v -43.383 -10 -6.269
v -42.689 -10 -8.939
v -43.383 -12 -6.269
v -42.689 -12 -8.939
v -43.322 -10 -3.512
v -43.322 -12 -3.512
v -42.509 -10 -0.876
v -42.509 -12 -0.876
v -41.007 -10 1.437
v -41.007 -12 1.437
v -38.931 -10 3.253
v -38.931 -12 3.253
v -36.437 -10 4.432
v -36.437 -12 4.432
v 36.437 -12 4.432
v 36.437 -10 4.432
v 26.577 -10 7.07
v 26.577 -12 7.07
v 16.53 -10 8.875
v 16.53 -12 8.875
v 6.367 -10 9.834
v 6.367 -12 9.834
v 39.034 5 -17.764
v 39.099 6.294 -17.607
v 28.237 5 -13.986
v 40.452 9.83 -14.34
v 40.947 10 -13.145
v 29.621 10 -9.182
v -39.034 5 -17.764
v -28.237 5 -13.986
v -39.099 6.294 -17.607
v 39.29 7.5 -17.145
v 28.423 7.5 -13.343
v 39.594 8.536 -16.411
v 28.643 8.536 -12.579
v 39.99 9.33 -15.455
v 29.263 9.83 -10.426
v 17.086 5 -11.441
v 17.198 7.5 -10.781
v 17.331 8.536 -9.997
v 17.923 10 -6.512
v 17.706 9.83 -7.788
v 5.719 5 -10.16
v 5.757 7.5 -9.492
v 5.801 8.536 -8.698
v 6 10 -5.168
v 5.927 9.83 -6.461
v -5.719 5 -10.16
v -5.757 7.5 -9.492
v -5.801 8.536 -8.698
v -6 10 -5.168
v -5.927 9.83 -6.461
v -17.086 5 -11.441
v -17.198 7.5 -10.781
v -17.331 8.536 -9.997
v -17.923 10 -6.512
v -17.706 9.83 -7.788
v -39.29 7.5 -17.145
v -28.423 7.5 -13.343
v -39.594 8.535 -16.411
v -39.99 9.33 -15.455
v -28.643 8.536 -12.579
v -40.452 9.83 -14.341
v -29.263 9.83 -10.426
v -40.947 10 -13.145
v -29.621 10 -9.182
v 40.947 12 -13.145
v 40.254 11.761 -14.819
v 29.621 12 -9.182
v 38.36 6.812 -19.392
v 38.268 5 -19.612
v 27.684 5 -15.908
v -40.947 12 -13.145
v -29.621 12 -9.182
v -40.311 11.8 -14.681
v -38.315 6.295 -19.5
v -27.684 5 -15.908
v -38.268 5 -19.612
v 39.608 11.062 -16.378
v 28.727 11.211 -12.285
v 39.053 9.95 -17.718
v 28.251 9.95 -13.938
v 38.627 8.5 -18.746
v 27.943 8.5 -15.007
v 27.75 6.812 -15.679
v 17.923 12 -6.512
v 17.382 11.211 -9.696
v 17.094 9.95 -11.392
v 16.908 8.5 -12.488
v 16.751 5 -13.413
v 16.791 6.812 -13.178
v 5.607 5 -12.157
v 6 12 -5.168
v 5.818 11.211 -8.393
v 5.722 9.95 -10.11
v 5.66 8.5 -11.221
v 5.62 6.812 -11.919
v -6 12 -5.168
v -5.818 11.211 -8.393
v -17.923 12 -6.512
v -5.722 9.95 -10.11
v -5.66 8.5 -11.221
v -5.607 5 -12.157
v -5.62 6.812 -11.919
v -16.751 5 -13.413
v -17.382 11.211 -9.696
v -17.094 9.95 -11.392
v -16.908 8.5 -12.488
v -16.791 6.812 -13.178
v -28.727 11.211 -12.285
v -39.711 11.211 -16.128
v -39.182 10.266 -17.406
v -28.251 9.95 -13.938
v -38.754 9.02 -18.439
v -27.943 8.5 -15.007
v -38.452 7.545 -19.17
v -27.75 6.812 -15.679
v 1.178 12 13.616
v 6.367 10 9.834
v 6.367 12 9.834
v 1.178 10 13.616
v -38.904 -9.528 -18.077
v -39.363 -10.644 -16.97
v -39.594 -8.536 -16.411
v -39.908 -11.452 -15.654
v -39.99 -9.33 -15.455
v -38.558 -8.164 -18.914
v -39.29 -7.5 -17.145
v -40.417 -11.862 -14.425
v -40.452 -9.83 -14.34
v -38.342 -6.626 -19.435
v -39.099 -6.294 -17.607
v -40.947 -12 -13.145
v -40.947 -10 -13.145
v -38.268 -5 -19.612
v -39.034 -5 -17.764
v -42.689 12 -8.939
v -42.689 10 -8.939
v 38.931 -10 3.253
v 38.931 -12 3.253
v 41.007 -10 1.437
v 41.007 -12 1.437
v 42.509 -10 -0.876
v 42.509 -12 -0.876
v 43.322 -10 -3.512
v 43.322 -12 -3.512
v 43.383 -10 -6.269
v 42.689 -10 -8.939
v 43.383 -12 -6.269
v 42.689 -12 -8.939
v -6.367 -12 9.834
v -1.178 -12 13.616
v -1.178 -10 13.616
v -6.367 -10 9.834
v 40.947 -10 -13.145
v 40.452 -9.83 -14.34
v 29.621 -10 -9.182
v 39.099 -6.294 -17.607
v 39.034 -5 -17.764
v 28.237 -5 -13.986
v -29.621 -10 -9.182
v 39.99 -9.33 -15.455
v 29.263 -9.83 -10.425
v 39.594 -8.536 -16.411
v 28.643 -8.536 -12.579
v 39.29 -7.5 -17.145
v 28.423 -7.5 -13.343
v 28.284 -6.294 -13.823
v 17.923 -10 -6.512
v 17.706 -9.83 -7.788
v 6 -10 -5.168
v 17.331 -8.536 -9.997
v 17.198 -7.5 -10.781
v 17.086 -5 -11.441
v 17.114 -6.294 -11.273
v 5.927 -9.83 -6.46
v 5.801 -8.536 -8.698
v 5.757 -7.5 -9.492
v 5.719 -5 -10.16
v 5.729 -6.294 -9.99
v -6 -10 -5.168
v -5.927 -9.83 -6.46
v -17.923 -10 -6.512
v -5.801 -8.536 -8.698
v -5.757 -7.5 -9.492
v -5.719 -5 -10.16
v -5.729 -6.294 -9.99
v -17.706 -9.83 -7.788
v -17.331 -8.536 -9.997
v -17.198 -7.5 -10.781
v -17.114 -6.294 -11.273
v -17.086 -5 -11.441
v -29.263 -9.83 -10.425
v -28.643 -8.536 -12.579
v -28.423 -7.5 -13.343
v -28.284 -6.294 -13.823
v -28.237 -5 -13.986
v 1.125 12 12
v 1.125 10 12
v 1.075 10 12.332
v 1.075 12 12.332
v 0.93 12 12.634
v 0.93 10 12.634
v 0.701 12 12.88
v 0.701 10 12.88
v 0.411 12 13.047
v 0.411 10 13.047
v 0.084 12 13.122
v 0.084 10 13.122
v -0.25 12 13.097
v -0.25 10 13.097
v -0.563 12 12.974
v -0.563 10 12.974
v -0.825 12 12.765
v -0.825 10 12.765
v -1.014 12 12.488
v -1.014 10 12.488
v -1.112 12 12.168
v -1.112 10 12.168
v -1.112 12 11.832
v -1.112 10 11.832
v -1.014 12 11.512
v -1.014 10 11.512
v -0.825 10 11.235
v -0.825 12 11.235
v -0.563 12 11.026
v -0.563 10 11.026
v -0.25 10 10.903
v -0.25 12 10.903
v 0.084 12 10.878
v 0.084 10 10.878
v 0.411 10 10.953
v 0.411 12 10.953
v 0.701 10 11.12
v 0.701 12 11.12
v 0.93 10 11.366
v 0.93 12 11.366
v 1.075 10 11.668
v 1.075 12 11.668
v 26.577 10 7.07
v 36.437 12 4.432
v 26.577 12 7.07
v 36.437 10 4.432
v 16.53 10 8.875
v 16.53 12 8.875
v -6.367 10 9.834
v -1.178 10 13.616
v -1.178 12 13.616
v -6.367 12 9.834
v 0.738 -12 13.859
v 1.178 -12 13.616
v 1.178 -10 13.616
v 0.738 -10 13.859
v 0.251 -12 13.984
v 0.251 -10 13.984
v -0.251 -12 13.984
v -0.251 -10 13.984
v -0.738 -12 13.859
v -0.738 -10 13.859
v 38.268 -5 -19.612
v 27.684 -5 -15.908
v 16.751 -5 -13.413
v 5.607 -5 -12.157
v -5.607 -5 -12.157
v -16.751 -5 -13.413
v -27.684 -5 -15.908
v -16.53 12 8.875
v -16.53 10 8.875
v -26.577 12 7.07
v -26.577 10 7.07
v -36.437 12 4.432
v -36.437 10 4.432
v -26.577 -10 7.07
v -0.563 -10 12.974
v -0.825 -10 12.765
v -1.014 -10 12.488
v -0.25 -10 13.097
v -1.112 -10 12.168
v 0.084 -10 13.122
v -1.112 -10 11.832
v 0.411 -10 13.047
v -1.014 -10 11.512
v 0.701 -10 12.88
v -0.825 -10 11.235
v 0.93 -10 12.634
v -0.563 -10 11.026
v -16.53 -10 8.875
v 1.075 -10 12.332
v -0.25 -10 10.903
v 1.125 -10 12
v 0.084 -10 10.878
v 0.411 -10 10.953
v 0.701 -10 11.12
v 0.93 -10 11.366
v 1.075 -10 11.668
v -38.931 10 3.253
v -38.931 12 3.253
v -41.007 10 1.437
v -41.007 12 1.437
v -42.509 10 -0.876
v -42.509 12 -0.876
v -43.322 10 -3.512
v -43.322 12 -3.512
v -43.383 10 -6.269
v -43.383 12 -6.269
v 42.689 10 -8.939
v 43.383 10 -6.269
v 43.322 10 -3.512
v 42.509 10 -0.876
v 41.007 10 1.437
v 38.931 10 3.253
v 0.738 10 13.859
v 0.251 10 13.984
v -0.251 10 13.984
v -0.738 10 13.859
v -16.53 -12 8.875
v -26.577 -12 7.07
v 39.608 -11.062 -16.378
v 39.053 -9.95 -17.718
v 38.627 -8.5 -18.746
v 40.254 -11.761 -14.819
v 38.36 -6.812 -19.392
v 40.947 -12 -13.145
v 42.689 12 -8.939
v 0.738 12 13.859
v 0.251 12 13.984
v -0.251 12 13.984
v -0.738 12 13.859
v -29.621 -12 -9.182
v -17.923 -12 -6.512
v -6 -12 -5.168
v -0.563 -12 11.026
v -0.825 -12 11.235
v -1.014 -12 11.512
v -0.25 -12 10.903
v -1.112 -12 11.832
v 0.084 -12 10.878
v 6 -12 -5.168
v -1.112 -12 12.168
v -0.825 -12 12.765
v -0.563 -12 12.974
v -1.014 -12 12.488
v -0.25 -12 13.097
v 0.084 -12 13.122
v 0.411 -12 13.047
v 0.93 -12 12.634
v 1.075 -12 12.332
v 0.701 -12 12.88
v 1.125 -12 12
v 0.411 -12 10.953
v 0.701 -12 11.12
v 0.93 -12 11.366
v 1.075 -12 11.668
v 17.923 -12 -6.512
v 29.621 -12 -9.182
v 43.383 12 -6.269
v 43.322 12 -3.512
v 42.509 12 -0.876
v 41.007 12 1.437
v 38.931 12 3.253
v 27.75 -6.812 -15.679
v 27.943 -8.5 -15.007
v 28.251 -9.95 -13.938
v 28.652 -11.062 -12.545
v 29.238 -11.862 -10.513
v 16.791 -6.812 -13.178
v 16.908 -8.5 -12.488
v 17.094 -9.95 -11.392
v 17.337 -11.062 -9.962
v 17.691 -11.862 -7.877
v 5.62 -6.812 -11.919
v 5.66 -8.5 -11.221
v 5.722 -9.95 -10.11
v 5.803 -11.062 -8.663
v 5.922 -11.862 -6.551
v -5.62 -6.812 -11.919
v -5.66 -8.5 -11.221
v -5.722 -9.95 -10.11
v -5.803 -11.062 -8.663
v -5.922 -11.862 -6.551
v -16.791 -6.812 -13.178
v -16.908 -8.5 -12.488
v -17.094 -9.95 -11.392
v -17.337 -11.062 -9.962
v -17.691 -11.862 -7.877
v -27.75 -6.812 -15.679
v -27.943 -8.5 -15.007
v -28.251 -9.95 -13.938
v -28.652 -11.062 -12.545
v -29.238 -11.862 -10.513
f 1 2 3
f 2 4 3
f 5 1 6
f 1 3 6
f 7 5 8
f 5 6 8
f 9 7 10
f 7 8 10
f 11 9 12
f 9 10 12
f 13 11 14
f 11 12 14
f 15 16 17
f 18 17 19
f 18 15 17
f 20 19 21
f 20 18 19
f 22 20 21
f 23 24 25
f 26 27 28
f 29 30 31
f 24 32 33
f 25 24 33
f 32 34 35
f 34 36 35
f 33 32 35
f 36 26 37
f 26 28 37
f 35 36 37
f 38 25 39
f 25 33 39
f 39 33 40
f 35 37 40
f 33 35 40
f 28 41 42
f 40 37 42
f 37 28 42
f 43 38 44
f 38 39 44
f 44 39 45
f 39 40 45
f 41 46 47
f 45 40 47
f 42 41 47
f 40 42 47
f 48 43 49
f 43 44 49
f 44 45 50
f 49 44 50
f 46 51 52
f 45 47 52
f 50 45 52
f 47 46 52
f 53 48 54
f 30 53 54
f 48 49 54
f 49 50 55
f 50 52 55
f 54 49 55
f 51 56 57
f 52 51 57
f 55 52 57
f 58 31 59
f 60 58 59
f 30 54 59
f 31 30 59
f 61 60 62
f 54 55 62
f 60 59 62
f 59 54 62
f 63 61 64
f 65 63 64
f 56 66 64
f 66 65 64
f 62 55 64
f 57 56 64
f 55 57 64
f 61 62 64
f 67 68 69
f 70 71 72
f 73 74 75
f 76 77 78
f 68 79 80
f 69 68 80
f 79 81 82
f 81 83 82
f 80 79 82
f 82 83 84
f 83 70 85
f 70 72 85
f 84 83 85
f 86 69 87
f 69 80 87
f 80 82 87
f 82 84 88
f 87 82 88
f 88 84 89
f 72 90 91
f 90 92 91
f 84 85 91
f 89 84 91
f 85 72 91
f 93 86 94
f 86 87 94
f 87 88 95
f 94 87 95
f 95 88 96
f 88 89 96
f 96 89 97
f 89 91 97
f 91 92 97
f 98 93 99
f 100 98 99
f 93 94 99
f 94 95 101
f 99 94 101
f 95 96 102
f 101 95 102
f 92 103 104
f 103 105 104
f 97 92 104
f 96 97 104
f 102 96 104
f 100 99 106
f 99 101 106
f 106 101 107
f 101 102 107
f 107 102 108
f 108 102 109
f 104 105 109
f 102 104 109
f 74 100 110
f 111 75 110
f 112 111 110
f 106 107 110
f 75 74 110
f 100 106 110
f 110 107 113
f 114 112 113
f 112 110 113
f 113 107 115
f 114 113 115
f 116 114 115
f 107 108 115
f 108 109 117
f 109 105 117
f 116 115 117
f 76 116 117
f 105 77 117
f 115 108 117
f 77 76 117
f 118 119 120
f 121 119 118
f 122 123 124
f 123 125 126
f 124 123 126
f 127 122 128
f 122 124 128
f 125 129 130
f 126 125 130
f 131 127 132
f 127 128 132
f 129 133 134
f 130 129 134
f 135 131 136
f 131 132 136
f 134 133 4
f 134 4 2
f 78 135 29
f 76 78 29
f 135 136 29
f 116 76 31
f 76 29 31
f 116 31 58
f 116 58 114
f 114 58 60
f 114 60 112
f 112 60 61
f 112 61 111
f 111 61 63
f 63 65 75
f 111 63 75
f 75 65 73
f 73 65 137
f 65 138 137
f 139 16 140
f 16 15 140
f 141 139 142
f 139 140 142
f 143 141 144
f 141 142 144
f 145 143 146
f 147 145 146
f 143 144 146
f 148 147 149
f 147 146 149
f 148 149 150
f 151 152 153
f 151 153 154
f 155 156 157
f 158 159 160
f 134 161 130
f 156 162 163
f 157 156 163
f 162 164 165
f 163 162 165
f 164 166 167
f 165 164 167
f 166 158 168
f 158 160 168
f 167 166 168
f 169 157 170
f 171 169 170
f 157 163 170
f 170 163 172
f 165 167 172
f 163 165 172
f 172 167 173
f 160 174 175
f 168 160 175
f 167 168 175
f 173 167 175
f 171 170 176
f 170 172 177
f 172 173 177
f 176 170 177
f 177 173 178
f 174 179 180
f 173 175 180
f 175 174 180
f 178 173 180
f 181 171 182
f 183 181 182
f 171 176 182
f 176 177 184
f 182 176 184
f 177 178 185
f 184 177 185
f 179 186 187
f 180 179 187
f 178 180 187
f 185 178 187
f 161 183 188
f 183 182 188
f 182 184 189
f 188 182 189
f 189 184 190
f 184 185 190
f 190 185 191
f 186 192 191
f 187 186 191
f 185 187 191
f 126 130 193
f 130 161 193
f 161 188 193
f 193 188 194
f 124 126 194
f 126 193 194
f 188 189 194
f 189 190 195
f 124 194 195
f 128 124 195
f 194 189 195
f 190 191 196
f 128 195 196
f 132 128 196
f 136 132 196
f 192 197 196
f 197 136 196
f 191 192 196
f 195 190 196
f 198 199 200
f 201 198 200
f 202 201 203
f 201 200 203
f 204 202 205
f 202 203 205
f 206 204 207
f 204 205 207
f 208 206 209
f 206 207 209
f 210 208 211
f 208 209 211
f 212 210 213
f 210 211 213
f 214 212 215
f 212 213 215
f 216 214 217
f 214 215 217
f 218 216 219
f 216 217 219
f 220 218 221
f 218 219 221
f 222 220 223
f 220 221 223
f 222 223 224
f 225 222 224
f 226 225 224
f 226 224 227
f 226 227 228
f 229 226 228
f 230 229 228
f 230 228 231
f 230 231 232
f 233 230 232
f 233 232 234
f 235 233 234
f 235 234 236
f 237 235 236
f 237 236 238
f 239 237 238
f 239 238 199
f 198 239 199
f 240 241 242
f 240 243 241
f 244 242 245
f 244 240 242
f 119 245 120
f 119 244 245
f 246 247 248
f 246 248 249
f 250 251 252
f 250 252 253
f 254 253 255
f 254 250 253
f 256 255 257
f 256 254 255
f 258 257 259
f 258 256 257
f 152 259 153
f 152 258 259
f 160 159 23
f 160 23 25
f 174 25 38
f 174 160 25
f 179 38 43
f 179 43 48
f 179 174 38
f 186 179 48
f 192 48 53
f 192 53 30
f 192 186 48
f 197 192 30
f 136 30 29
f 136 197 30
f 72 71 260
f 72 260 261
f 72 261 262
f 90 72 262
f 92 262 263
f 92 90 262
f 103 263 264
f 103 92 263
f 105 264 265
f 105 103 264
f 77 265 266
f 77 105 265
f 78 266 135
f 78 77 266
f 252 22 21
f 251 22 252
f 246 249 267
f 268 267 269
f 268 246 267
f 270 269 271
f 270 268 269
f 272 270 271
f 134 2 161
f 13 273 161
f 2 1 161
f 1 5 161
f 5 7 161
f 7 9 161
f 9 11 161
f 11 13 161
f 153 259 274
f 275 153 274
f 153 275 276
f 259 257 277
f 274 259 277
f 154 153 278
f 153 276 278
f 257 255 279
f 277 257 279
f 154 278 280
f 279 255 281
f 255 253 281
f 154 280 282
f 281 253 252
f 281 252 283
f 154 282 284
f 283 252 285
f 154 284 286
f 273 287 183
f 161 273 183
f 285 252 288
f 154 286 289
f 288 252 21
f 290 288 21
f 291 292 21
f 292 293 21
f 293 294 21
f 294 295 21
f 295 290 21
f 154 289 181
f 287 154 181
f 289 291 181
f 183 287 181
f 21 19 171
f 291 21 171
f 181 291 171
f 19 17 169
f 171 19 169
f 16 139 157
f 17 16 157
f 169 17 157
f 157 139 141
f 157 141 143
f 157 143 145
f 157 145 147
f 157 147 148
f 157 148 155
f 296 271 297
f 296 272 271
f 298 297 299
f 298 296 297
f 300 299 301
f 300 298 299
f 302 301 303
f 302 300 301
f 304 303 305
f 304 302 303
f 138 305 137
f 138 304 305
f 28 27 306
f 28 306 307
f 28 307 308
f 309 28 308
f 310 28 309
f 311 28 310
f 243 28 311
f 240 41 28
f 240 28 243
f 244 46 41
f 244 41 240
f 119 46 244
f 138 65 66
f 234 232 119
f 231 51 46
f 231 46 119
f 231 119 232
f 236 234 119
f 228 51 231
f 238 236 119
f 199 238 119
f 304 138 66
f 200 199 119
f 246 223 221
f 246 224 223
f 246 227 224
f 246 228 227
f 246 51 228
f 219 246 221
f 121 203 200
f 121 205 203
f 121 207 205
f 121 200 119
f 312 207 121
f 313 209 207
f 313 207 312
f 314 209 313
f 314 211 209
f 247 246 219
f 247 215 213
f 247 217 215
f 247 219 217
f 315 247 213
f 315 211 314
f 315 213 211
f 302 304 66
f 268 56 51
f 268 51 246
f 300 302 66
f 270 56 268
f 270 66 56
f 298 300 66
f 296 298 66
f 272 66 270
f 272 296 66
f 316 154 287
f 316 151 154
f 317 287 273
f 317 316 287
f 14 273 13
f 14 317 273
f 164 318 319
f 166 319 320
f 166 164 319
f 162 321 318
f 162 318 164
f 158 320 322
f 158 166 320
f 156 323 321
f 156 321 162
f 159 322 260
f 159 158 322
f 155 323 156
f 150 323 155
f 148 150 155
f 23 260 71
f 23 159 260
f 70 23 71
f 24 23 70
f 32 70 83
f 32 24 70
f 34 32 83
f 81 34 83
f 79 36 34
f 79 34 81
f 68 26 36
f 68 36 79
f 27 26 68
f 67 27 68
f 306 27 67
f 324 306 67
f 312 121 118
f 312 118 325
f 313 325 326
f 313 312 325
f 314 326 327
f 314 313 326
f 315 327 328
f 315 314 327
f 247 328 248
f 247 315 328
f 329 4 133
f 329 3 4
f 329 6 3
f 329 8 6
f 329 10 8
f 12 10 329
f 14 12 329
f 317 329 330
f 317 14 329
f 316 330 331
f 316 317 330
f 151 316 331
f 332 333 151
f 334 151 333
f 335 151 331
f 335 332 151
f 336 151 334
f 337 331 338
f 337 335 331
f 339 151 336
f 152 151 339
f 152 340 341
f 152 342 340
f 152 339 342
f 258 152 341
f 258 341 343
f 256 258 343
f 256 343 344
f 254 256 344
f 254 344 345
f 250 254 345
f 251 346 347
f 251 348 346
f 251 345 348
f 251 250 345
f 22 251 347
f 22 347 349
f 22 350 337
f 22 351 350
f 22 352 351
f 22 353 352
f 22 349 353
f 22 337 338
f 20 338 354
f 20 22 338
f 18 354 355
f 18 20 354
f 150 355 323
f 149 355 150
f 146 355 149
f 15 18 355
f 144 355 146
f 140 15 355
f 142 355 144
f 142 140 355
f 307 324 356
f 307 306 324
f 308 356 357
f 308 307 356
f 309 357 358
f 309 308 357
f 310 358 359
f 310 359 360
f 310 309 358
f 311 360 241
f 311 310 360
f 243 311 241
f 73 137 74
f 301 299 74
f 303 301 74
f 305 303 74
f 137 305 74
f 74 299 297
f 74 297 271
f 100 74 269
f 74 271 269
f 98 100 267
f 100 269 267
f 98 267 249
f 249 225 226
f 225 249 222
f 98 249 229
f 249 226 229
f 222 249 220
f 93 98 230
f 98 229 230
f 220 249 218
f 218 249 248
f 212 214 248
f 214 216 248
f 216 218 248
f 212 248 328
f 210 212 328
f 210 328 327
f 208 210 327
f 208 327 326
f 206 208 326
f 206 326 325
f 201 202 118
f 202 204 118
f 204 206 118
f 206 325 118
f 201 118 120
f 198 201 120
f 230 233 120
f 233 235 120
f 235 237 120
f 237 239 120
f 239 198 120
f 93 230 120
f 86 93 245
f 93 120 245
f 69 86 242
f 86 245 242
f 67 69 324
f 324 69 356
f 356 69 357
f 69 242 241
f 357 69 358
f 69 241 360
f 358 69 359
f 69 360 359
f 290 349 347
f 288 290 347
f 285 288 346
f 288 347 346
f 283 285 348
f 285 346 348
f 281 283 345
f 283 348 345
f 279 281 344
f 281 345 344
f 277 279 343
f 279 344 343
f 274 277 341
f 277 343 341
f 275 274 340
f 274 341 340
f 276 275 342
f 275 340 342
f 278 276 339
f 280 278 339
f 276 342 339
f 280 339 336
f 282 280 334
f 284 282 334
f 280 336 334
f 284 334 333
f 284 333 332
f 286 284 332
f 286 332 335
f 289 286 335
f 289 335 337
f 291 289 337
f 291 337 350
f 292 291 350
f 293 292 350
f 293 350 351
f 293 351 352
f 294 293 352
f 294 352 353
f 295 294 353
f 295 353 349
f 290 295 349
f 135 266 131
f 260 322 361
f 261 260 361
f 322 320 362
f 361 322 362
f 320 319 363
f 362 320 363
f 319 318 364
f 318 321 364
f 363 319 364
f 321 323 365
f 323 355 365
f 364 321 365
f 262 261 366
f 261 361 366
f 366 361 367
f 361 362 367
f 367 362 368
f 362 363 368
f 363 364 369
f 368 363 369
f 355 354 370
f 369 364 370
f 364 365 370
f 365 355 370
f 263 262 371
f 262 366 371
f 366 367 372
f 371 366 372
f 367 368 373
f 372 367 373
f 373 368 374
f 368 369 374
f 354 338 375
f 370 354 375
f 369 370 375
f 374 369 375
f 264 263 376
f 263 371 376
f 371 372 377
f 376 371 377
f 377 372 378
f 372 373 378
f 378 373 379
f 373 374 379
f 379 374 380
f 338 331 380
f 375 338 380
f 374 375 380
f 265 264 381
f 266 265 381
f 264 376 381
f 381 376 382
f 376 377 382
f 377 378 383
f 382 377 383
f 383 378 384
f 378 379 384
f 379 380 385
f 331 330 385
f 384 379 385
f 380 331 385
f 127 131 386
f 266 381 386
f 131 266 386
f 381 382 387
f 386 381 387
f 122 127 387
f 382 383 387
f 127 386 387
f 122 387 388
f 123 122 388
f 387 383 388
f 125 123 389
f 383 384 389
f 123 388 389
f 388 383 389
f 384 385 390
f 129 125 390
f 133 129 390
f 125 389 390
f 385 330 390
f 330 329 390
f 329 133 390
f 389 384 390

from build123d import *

# Parameters (mm, degrees)
F1_ANGLE_BACK = 22.5
F1_ANGLE      = 45
F2_R          = 1.125
F3_DEPTH      = 24
F5_DEPTH      = 10
F6_R          = 10
F7_R          = 5
F8_R          = 7


with BuildPart() as f1:
    # F0 (on Right) → F1 (revolve)
    with BuildSketch(Plane.YZ, mode=Mode.PRIVATE) as f1_sk:
        Polygon((10, 10), (10, -10), (-10, -10), (-10, 10), (-12, 10), (-12, -12), (12, -12), (12, 10), align=None)
    revolve(f1_sk.sketch.rotate(Axis((0, -36.9127653539, -112), (0, -1, 0)), -F1_ANGLE_BACK), axis=Axis((0, -36.9127653539, -112), (0, -1, 0)), revolution_arc=F1_ANGLE)

    # F2 (on face) → F3 (join)
    with BuildSketch(Plane.XZ.offset(12)):
        with BuildLine():
            Line((6.3674504599, 9.8337210079), (1.178053683, 13.6162269395))
            ThreePointArc((1.178053683, 13.6162269395), (0, 14), (-1.178053683, 13.6162269395))
            Line((-1.178053683, 13.6162269395), (-6.3674504599, 9.8337210079))
            ThreePointArc((-6.3674504599, 9.8337210079), (0, 10), (6.3674504599, 9.8337210079))
        make_face()
        with Locations((0, 12)):
            Circle(F2_R, mode=Mode.SUBTRACT)
    extrude(amount=-F3_DEPTH)

    # F4 (on Right) → F5 (cut, symmetric)
    with BuildSketch(Plane.YZ):
        Polygon((-10, 0), (0, 0), (10, 0), (10, 19.6699723601), (-10, 19.6699723601), align=None)
    extrude(amount=F5_DEPTH, both=True, mode=Mode.SUBTRACT)

    # F6
    f6_edges = [f1.edges().sort_by_distance(p)[0] for p in [
        (-46.687379, 11, 0.713303),
        (-46.687379, -11, 0.713303),
        (46.687379, -11, 0.713303),
        (46.687379, 11, 0.713303),
    ]]
    fillet(f6_edges, radius=F6_R)

    # F7
    f7_edges = [f1.edges().sort_by_distance(p)[0] for p in [
        (0, 10, -10),
        (0, -10, -10),
    ]]
    fillet(f7_edges, radius=F7_R)

    # F8
    f8_edges = [f1.edges().sort_by_distance(p)[0] for p in [
        (0, 12, -12),
        (0, -12, -12),
    ]]
    fillet(f8_edges, radius=F8_R)


solid = f1.part
